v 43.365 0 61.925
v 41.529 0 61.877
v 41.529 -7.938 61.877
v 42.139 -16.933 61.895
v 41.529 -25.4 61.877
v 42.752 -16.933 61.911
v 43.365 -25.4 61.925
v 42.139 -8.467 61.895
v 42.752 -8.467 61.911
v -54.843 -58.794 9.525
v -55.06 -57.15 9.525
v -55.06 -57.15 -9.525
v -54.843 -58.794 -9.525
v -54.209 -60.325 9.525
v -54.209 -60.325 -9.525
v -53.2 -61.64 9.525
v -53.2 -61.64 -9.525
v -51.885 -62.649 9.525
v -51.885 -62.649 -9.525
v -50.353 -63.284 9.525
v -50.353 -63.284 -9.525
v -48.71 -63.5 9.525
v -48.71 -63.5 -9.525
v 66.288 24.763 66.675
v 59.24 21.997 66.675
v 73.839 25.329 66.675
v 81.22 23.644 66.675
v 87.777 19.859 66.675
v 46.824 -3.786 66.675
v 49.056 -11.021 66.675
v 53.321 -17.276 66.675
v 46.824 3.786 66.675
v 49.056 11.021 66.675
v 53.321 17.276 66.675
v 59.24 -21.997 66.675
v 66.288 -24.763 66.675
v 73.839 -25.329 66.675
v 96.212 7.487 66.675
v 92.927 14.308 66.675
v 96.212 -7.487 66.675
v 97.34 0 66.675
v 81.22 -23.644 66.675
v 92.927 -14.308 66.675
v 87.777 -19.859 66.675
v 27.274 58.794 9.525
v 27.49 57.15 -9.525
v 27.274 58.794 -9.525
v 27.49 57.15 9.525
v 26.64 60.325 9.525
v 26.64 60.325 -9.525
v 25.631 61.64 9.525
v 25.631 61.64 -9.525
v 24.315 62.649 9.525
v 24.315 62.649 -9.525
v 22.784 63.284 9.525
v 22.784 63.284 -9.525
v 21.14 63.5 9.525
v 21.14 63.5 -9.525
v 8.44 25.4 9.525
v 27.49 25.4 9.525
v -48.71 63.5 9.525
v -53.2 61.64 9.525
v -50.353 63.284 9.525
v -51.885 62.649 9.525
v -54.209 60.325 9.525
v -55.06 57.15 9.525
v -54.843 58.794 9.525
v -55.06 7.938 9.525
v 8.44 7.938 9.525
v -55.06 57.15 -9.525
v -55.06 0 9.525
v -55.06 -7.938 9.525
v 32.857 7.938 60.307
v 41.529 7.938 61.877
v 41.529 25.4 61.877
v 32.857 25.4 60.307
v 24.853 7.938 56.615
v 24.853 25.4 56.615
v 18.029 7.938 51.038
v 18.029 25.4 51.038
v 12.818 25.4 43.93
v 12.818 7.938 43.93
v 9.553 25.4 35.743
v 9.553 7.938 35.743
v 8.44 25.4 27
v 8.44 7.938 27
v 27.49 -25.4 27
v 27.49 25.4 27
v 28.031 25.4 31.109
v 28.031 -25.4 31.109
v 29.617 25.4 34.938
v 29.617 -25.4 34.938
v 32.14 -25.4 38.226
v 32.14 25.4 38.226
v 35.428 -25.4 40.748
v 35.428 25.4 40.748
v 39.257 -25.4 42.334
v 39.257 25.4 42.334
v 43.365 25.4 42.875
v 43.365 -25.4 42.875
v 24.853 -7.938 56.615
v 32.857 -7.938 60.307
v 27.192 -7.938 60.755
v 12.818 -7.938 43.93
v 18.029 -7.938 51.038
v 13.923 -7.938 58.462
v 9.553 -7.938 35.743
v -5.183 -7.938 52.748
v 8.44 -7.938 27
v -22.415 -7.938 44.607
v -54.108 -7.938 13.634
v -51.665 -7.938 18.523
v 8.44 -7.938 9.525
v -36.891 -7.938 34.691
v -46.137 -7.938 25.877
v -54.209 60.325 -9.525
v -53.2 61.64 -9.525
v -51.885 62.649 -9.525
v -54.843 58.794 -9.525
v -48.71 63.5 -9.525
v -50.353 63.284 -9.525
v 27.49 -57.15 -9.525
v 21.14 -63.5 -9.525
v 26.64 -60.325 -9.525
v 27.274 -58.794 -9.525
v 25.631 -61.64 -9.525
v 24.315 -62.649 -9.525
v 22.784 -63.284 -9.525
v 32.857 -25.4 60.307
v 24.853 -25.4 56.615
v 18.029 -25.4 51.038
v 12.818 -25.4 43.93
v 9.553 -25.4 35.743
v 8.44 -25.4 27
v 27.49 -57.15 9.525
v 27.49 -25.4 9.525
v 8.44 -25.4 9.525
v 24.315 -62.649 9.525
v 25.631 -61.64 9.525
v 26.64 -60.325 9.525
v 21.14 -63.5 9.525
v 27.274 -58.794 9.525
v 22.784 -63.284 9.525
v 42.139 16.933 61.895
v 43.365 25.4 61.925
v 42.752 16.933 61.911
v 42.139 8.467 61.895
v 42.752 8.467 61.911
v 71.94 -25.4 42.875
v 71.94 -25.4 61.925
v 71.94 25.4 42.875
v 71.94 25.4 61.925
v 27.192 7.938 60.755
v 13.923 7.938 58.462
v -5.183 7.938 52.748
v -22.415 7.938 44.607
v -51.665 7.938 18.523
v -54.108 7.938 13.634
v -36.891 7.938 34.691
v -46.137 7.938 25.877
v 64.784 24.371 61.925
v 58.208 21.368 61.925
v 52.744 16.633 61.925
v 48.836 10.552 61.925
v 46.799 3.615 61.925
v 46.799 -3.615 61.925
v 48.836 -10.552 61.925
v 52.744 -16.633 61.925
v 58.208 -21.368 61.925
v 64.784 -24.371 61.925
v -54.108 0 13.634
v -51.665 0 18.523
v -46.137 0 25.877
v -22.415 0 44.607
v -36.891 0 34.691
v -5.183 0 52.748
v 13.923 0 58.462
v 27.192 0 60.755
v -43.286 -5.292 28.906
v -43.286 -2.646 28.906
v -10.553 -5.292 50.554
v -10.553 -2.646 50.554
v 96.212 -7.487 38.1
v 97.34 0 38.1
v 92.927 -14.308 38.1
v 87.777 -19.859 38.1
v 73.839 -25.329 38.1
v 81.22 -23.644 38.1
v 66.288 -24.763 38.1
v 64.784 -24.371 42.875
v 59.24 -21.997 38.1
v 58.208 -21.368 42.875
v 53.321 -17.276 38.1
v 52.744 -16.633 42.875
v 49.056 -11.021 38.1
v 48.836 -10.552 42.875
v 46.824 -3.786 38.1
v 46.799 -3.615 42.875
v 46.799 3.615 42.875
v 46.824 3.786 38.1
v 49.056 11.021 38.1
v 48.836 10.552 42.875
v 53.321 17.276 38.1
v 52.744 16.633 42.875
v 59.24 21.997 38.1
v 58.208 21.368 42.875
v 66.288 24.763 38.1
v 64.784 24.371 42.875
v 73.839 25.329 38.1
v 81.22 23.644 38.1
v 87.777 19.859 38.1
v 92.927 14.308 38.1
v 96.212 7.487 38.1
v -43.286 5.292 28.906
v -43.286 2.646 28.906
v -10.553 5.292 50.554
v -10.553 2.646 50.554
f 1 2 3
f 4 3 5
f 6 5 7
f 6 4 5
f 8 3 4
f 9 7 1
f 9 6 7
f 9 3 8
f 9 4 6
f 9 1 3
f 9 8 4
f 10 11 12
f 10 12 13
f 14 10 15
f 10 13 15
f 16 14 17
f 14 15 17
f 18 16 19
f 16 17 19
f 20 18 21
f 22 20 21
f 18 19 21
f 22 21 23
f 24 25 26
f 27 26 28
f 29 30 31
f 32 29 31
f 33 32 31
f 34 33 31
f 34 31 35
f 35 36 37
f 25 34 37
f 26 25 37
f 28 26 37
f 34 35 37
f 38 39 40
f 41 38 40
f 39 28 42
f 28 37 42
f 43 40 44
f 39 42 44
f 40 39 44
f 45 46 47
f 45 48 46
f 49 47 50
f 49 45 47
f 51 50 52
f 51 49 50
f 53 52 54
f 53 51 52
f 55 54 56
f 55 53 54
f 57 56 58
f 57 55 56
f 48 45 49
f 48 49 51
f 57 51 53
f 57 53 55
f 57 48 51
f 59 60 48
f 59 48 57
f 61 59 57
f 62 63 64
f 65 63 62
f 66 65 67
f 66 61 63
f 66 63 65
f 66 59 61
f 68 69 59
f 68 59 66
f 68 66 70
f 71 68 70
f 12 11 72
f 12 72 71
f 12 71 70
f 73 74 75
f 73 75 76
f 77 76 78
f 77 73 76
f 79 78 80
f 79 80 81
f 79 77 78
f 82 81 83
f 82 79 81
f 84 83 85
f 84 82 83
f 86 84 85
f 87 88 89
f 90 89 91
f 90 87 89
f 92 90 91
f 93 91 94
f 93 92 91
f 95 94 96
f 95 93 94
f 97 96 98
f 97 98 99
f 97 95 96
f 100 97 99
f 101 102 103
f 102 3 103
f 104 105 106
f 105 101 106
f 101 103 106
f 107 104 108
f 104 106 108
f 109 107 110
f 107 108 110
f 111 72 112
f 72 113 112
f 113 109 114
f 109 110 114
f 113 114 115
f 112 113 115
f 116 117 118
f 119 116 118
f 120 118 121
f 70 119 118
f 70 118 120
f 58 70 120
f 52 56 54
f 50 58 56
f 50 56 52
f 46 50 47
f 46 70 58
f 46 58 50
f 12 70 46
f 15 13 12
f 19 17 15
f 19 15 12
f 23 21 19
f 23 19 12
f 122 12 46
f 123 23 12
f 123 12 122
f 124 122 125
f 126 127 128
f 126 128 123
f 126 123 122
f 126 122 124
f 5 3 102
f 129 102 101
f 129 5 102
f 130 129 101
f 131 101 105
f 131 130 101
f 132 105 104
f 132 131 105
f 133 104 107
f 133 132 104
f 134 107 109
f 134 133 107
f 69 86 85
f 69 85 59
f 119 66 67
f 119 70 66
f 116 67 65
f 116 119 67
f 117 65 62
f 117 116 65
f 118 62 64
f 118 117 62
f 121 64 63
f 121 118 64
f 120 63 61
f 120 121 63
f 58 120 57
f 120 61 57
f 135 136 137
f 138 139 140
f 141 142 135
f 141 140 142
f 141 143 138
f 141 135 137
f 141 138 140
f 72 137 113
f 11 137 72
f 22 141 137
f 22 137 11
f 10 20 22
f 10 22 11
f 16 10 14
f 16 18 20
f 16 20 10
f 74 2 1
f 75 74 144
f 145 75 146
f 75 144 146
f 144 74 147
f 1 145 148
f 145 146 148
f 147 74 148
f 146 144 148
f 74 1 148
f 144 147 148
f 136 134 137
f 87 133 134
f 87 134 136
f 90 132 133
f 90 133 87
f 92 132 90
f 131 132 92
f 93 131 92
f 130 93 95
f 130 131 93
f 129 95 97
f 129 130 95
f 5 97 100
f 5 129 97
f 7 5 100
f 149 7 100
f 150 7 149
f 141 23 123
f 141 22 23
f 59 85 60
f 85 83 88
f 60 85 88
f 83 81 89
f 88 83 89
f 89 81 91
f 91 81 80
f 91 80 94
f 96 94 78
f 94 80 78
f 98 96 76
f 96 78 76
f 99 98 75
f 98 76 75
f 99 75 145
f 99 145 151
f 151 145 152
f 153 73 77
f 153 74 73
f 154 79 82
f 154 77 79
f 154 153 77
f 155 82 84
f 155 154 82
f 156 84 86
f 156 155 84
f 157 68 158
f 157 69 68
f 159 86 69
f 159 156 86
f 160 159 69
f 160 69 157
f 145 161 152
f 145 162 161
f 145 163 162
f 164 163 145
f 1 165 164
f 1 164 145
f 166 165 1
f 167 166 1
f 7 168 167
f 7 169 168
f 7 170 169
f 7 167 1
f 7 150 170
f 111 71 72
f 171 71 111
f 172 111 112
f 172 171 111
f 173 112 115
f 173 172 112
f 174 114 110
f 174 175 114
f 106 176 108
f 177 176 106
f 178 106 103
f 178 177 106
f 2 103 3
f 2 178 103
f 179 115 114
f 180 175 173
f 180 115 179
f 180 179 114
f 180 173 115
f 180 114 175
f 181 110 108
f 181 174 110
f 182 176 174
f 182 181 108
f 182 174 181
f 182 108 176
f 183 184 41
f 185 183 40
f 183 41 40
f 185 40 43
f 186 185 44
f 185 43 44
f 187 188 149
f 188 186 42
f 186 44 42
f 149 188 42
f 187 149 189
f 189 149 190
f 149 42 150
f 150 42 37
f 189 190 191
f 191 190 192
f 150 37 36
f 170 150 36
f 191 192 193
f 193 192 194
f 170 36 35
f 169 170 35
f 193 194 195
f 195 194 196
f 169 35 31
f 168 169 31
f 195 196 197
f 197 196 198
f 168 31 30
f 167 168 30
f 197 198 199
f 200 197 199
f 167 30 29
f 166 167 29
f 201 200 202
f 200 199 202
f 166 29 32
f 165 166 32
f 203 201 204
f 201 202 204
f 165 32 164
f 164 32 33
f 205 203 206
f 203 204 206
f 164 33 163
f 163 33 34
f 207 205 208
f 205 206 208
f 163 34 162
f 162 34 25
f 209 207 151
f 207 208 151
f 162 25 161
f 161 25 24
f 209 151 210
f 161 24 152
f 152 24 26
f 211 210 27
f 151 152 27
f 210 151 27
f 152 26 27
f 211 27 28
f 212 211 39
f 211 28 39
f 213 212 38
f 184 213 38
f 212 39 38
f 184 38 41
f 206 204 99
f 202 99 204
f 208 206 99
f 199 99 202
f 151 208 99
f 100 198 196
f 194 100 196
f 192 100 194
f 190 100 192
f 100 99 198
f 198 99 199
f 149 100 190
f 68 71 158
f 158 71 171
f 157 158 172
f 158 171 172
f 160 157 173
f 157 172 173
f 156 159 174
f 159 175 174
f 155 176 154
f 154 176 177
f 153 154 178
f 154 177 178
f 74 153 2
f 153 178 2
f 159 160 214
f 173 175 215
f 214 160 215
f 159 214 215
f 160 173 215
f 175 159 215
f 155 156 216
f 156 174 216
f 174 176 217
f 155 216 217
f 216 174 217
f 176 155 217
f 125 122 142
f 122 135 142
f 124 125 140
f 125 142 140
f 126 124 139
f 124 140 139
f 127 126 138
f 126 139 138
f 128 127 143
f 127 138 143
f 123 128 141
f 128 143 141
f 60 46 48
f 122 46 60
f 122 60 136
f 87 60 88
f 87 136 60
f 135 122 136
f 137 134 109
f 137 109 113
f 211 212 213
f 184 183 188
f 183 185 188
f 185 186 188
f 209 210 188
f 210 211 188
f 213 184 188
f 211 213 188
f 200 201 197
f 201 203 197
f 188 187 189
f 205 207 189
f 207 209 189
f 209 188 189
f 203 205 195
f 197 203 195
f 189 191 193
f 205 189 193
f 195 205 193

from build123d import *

# Parameters (mm, degrees)
F1_DEPTH = 63.5
F2_DEPTH = 7.9375
F0_W     = 25.4
F0_H     = 19.05
F3_DEPTH = 25.4
F5_R     = 6.35


with BuildPart() as f1:
    # F0 (on Front) → F1 (new body, symmetric)
    with BuildSketch(Plane.XZ):
        Polygon((-55.0595465731, -9.525), (27.4904534269, -9.525), (27.4904534269, 9.525), (8.4404534269, 9.525), (-55.0595465731, 9.525), align=None)
    extrude(amount=F1_DEPTH, both=True)

    # F0 (on Front) → F2 (join, symmetric)
    with BuildSketch(Plane.XZ):
        with BuildLine():
            add(Edge.make_bspline(
                [(-55.0595465731, 9.525), (-54.3032997663, 23.5735103389), (-19.6897995007, 59.915243166), (41.5291236908, 61.8768901827)],
                knots=[0, 0, 0, 0, 110.4053768548, 110.4053768548, 110.4053768548, 110.4053768548], degree=3))
            Line((-55.0595465731, 9.525), (8.4404534269, 9.525))
            Line((8.4404534269, 9.525), (8.4404534269, 27.0002))
            ThreePointArc((8.4404534269, 27.0002), (18.0288253853, 51.0378975703), (41.5291236908, 61.8768901827))
        make_face()
    extrude(amount=F2_DEPTH, both=True)

    # F0 (on Front) → F3 (join, symmetric)
    with BuildSketch(Plane.XZ):
        with BuildLine():
            Line((8.4404534269, 9.525), (27.4904534269, 9.525))
            Line((27.4904534269, 9.525), (27.4904534269, 27.0002))
            ThreePointArc((27.4904534269, 27.0002), (32.1401332756, 38.2255201513), (43.3654534269, 42.8752))
            Line((43.3654534269, 42.8752), (46.5404534269, 42.8752))
            Line((46.5404534269, 42.8752), (46.5404534269, 61.9252))
            Line((46.5404534269, 61.9252), (43.3654534269, 61.9252))
            add(Edge.make_bspline(
                [(41.5291236908, 61.8768901827), (42.1385989828, 61.8964196897), (42.7507112801, 61.9125416031), (43.3654534269, 61.9252)],
                knots=[110.4053768548, 110.4053768548, 110.4053768548, 110.4053768548, 111.5045361635, 111.5045361635, 111.5045361635, 111.5045361635], degree=3))
            ThreePointArc((41.5291236908, 61.8768901827), (18.0288253853, 51.0378975703), (8.4404534269, 27.0002))
            Line((8.4404534269, 27.0002), (8.4404534269, 9.525))
        make_face()
        with Locations((59.2404534269, 52.4002)):
            Rectangle(F0_W, F0_H)
    extrude(amount=F3_DEPTH, both=True)

    # F0 (on Front) → F4 (revolve)
    with BuildSketch(Plane.XZ):
        Polygon((71.9404534269, 61.9252), (71.9404534269, 42.8752), (71.9404534269, 38.1), (97.3404534269, 38.1), (97.3404534269, 66.675), (71.9404534269, 66.675), align=None)
    revolve(axis=Axis((71.9404534269, 0, 52.3875), (0, 0, -1)))

    # F5
    f5_edges = [f1.edges().sort_by_distance(p)[0] for p in [
        (-55.059547, -63.5, 0),
        (27.490453, -63.5, 0),
        (-55.059547, 63.5, 0),
        (27.490453, 63.5, 0),
    ]]
    fillet(f5_edges, radius=F5_R)


solid = f1.part
